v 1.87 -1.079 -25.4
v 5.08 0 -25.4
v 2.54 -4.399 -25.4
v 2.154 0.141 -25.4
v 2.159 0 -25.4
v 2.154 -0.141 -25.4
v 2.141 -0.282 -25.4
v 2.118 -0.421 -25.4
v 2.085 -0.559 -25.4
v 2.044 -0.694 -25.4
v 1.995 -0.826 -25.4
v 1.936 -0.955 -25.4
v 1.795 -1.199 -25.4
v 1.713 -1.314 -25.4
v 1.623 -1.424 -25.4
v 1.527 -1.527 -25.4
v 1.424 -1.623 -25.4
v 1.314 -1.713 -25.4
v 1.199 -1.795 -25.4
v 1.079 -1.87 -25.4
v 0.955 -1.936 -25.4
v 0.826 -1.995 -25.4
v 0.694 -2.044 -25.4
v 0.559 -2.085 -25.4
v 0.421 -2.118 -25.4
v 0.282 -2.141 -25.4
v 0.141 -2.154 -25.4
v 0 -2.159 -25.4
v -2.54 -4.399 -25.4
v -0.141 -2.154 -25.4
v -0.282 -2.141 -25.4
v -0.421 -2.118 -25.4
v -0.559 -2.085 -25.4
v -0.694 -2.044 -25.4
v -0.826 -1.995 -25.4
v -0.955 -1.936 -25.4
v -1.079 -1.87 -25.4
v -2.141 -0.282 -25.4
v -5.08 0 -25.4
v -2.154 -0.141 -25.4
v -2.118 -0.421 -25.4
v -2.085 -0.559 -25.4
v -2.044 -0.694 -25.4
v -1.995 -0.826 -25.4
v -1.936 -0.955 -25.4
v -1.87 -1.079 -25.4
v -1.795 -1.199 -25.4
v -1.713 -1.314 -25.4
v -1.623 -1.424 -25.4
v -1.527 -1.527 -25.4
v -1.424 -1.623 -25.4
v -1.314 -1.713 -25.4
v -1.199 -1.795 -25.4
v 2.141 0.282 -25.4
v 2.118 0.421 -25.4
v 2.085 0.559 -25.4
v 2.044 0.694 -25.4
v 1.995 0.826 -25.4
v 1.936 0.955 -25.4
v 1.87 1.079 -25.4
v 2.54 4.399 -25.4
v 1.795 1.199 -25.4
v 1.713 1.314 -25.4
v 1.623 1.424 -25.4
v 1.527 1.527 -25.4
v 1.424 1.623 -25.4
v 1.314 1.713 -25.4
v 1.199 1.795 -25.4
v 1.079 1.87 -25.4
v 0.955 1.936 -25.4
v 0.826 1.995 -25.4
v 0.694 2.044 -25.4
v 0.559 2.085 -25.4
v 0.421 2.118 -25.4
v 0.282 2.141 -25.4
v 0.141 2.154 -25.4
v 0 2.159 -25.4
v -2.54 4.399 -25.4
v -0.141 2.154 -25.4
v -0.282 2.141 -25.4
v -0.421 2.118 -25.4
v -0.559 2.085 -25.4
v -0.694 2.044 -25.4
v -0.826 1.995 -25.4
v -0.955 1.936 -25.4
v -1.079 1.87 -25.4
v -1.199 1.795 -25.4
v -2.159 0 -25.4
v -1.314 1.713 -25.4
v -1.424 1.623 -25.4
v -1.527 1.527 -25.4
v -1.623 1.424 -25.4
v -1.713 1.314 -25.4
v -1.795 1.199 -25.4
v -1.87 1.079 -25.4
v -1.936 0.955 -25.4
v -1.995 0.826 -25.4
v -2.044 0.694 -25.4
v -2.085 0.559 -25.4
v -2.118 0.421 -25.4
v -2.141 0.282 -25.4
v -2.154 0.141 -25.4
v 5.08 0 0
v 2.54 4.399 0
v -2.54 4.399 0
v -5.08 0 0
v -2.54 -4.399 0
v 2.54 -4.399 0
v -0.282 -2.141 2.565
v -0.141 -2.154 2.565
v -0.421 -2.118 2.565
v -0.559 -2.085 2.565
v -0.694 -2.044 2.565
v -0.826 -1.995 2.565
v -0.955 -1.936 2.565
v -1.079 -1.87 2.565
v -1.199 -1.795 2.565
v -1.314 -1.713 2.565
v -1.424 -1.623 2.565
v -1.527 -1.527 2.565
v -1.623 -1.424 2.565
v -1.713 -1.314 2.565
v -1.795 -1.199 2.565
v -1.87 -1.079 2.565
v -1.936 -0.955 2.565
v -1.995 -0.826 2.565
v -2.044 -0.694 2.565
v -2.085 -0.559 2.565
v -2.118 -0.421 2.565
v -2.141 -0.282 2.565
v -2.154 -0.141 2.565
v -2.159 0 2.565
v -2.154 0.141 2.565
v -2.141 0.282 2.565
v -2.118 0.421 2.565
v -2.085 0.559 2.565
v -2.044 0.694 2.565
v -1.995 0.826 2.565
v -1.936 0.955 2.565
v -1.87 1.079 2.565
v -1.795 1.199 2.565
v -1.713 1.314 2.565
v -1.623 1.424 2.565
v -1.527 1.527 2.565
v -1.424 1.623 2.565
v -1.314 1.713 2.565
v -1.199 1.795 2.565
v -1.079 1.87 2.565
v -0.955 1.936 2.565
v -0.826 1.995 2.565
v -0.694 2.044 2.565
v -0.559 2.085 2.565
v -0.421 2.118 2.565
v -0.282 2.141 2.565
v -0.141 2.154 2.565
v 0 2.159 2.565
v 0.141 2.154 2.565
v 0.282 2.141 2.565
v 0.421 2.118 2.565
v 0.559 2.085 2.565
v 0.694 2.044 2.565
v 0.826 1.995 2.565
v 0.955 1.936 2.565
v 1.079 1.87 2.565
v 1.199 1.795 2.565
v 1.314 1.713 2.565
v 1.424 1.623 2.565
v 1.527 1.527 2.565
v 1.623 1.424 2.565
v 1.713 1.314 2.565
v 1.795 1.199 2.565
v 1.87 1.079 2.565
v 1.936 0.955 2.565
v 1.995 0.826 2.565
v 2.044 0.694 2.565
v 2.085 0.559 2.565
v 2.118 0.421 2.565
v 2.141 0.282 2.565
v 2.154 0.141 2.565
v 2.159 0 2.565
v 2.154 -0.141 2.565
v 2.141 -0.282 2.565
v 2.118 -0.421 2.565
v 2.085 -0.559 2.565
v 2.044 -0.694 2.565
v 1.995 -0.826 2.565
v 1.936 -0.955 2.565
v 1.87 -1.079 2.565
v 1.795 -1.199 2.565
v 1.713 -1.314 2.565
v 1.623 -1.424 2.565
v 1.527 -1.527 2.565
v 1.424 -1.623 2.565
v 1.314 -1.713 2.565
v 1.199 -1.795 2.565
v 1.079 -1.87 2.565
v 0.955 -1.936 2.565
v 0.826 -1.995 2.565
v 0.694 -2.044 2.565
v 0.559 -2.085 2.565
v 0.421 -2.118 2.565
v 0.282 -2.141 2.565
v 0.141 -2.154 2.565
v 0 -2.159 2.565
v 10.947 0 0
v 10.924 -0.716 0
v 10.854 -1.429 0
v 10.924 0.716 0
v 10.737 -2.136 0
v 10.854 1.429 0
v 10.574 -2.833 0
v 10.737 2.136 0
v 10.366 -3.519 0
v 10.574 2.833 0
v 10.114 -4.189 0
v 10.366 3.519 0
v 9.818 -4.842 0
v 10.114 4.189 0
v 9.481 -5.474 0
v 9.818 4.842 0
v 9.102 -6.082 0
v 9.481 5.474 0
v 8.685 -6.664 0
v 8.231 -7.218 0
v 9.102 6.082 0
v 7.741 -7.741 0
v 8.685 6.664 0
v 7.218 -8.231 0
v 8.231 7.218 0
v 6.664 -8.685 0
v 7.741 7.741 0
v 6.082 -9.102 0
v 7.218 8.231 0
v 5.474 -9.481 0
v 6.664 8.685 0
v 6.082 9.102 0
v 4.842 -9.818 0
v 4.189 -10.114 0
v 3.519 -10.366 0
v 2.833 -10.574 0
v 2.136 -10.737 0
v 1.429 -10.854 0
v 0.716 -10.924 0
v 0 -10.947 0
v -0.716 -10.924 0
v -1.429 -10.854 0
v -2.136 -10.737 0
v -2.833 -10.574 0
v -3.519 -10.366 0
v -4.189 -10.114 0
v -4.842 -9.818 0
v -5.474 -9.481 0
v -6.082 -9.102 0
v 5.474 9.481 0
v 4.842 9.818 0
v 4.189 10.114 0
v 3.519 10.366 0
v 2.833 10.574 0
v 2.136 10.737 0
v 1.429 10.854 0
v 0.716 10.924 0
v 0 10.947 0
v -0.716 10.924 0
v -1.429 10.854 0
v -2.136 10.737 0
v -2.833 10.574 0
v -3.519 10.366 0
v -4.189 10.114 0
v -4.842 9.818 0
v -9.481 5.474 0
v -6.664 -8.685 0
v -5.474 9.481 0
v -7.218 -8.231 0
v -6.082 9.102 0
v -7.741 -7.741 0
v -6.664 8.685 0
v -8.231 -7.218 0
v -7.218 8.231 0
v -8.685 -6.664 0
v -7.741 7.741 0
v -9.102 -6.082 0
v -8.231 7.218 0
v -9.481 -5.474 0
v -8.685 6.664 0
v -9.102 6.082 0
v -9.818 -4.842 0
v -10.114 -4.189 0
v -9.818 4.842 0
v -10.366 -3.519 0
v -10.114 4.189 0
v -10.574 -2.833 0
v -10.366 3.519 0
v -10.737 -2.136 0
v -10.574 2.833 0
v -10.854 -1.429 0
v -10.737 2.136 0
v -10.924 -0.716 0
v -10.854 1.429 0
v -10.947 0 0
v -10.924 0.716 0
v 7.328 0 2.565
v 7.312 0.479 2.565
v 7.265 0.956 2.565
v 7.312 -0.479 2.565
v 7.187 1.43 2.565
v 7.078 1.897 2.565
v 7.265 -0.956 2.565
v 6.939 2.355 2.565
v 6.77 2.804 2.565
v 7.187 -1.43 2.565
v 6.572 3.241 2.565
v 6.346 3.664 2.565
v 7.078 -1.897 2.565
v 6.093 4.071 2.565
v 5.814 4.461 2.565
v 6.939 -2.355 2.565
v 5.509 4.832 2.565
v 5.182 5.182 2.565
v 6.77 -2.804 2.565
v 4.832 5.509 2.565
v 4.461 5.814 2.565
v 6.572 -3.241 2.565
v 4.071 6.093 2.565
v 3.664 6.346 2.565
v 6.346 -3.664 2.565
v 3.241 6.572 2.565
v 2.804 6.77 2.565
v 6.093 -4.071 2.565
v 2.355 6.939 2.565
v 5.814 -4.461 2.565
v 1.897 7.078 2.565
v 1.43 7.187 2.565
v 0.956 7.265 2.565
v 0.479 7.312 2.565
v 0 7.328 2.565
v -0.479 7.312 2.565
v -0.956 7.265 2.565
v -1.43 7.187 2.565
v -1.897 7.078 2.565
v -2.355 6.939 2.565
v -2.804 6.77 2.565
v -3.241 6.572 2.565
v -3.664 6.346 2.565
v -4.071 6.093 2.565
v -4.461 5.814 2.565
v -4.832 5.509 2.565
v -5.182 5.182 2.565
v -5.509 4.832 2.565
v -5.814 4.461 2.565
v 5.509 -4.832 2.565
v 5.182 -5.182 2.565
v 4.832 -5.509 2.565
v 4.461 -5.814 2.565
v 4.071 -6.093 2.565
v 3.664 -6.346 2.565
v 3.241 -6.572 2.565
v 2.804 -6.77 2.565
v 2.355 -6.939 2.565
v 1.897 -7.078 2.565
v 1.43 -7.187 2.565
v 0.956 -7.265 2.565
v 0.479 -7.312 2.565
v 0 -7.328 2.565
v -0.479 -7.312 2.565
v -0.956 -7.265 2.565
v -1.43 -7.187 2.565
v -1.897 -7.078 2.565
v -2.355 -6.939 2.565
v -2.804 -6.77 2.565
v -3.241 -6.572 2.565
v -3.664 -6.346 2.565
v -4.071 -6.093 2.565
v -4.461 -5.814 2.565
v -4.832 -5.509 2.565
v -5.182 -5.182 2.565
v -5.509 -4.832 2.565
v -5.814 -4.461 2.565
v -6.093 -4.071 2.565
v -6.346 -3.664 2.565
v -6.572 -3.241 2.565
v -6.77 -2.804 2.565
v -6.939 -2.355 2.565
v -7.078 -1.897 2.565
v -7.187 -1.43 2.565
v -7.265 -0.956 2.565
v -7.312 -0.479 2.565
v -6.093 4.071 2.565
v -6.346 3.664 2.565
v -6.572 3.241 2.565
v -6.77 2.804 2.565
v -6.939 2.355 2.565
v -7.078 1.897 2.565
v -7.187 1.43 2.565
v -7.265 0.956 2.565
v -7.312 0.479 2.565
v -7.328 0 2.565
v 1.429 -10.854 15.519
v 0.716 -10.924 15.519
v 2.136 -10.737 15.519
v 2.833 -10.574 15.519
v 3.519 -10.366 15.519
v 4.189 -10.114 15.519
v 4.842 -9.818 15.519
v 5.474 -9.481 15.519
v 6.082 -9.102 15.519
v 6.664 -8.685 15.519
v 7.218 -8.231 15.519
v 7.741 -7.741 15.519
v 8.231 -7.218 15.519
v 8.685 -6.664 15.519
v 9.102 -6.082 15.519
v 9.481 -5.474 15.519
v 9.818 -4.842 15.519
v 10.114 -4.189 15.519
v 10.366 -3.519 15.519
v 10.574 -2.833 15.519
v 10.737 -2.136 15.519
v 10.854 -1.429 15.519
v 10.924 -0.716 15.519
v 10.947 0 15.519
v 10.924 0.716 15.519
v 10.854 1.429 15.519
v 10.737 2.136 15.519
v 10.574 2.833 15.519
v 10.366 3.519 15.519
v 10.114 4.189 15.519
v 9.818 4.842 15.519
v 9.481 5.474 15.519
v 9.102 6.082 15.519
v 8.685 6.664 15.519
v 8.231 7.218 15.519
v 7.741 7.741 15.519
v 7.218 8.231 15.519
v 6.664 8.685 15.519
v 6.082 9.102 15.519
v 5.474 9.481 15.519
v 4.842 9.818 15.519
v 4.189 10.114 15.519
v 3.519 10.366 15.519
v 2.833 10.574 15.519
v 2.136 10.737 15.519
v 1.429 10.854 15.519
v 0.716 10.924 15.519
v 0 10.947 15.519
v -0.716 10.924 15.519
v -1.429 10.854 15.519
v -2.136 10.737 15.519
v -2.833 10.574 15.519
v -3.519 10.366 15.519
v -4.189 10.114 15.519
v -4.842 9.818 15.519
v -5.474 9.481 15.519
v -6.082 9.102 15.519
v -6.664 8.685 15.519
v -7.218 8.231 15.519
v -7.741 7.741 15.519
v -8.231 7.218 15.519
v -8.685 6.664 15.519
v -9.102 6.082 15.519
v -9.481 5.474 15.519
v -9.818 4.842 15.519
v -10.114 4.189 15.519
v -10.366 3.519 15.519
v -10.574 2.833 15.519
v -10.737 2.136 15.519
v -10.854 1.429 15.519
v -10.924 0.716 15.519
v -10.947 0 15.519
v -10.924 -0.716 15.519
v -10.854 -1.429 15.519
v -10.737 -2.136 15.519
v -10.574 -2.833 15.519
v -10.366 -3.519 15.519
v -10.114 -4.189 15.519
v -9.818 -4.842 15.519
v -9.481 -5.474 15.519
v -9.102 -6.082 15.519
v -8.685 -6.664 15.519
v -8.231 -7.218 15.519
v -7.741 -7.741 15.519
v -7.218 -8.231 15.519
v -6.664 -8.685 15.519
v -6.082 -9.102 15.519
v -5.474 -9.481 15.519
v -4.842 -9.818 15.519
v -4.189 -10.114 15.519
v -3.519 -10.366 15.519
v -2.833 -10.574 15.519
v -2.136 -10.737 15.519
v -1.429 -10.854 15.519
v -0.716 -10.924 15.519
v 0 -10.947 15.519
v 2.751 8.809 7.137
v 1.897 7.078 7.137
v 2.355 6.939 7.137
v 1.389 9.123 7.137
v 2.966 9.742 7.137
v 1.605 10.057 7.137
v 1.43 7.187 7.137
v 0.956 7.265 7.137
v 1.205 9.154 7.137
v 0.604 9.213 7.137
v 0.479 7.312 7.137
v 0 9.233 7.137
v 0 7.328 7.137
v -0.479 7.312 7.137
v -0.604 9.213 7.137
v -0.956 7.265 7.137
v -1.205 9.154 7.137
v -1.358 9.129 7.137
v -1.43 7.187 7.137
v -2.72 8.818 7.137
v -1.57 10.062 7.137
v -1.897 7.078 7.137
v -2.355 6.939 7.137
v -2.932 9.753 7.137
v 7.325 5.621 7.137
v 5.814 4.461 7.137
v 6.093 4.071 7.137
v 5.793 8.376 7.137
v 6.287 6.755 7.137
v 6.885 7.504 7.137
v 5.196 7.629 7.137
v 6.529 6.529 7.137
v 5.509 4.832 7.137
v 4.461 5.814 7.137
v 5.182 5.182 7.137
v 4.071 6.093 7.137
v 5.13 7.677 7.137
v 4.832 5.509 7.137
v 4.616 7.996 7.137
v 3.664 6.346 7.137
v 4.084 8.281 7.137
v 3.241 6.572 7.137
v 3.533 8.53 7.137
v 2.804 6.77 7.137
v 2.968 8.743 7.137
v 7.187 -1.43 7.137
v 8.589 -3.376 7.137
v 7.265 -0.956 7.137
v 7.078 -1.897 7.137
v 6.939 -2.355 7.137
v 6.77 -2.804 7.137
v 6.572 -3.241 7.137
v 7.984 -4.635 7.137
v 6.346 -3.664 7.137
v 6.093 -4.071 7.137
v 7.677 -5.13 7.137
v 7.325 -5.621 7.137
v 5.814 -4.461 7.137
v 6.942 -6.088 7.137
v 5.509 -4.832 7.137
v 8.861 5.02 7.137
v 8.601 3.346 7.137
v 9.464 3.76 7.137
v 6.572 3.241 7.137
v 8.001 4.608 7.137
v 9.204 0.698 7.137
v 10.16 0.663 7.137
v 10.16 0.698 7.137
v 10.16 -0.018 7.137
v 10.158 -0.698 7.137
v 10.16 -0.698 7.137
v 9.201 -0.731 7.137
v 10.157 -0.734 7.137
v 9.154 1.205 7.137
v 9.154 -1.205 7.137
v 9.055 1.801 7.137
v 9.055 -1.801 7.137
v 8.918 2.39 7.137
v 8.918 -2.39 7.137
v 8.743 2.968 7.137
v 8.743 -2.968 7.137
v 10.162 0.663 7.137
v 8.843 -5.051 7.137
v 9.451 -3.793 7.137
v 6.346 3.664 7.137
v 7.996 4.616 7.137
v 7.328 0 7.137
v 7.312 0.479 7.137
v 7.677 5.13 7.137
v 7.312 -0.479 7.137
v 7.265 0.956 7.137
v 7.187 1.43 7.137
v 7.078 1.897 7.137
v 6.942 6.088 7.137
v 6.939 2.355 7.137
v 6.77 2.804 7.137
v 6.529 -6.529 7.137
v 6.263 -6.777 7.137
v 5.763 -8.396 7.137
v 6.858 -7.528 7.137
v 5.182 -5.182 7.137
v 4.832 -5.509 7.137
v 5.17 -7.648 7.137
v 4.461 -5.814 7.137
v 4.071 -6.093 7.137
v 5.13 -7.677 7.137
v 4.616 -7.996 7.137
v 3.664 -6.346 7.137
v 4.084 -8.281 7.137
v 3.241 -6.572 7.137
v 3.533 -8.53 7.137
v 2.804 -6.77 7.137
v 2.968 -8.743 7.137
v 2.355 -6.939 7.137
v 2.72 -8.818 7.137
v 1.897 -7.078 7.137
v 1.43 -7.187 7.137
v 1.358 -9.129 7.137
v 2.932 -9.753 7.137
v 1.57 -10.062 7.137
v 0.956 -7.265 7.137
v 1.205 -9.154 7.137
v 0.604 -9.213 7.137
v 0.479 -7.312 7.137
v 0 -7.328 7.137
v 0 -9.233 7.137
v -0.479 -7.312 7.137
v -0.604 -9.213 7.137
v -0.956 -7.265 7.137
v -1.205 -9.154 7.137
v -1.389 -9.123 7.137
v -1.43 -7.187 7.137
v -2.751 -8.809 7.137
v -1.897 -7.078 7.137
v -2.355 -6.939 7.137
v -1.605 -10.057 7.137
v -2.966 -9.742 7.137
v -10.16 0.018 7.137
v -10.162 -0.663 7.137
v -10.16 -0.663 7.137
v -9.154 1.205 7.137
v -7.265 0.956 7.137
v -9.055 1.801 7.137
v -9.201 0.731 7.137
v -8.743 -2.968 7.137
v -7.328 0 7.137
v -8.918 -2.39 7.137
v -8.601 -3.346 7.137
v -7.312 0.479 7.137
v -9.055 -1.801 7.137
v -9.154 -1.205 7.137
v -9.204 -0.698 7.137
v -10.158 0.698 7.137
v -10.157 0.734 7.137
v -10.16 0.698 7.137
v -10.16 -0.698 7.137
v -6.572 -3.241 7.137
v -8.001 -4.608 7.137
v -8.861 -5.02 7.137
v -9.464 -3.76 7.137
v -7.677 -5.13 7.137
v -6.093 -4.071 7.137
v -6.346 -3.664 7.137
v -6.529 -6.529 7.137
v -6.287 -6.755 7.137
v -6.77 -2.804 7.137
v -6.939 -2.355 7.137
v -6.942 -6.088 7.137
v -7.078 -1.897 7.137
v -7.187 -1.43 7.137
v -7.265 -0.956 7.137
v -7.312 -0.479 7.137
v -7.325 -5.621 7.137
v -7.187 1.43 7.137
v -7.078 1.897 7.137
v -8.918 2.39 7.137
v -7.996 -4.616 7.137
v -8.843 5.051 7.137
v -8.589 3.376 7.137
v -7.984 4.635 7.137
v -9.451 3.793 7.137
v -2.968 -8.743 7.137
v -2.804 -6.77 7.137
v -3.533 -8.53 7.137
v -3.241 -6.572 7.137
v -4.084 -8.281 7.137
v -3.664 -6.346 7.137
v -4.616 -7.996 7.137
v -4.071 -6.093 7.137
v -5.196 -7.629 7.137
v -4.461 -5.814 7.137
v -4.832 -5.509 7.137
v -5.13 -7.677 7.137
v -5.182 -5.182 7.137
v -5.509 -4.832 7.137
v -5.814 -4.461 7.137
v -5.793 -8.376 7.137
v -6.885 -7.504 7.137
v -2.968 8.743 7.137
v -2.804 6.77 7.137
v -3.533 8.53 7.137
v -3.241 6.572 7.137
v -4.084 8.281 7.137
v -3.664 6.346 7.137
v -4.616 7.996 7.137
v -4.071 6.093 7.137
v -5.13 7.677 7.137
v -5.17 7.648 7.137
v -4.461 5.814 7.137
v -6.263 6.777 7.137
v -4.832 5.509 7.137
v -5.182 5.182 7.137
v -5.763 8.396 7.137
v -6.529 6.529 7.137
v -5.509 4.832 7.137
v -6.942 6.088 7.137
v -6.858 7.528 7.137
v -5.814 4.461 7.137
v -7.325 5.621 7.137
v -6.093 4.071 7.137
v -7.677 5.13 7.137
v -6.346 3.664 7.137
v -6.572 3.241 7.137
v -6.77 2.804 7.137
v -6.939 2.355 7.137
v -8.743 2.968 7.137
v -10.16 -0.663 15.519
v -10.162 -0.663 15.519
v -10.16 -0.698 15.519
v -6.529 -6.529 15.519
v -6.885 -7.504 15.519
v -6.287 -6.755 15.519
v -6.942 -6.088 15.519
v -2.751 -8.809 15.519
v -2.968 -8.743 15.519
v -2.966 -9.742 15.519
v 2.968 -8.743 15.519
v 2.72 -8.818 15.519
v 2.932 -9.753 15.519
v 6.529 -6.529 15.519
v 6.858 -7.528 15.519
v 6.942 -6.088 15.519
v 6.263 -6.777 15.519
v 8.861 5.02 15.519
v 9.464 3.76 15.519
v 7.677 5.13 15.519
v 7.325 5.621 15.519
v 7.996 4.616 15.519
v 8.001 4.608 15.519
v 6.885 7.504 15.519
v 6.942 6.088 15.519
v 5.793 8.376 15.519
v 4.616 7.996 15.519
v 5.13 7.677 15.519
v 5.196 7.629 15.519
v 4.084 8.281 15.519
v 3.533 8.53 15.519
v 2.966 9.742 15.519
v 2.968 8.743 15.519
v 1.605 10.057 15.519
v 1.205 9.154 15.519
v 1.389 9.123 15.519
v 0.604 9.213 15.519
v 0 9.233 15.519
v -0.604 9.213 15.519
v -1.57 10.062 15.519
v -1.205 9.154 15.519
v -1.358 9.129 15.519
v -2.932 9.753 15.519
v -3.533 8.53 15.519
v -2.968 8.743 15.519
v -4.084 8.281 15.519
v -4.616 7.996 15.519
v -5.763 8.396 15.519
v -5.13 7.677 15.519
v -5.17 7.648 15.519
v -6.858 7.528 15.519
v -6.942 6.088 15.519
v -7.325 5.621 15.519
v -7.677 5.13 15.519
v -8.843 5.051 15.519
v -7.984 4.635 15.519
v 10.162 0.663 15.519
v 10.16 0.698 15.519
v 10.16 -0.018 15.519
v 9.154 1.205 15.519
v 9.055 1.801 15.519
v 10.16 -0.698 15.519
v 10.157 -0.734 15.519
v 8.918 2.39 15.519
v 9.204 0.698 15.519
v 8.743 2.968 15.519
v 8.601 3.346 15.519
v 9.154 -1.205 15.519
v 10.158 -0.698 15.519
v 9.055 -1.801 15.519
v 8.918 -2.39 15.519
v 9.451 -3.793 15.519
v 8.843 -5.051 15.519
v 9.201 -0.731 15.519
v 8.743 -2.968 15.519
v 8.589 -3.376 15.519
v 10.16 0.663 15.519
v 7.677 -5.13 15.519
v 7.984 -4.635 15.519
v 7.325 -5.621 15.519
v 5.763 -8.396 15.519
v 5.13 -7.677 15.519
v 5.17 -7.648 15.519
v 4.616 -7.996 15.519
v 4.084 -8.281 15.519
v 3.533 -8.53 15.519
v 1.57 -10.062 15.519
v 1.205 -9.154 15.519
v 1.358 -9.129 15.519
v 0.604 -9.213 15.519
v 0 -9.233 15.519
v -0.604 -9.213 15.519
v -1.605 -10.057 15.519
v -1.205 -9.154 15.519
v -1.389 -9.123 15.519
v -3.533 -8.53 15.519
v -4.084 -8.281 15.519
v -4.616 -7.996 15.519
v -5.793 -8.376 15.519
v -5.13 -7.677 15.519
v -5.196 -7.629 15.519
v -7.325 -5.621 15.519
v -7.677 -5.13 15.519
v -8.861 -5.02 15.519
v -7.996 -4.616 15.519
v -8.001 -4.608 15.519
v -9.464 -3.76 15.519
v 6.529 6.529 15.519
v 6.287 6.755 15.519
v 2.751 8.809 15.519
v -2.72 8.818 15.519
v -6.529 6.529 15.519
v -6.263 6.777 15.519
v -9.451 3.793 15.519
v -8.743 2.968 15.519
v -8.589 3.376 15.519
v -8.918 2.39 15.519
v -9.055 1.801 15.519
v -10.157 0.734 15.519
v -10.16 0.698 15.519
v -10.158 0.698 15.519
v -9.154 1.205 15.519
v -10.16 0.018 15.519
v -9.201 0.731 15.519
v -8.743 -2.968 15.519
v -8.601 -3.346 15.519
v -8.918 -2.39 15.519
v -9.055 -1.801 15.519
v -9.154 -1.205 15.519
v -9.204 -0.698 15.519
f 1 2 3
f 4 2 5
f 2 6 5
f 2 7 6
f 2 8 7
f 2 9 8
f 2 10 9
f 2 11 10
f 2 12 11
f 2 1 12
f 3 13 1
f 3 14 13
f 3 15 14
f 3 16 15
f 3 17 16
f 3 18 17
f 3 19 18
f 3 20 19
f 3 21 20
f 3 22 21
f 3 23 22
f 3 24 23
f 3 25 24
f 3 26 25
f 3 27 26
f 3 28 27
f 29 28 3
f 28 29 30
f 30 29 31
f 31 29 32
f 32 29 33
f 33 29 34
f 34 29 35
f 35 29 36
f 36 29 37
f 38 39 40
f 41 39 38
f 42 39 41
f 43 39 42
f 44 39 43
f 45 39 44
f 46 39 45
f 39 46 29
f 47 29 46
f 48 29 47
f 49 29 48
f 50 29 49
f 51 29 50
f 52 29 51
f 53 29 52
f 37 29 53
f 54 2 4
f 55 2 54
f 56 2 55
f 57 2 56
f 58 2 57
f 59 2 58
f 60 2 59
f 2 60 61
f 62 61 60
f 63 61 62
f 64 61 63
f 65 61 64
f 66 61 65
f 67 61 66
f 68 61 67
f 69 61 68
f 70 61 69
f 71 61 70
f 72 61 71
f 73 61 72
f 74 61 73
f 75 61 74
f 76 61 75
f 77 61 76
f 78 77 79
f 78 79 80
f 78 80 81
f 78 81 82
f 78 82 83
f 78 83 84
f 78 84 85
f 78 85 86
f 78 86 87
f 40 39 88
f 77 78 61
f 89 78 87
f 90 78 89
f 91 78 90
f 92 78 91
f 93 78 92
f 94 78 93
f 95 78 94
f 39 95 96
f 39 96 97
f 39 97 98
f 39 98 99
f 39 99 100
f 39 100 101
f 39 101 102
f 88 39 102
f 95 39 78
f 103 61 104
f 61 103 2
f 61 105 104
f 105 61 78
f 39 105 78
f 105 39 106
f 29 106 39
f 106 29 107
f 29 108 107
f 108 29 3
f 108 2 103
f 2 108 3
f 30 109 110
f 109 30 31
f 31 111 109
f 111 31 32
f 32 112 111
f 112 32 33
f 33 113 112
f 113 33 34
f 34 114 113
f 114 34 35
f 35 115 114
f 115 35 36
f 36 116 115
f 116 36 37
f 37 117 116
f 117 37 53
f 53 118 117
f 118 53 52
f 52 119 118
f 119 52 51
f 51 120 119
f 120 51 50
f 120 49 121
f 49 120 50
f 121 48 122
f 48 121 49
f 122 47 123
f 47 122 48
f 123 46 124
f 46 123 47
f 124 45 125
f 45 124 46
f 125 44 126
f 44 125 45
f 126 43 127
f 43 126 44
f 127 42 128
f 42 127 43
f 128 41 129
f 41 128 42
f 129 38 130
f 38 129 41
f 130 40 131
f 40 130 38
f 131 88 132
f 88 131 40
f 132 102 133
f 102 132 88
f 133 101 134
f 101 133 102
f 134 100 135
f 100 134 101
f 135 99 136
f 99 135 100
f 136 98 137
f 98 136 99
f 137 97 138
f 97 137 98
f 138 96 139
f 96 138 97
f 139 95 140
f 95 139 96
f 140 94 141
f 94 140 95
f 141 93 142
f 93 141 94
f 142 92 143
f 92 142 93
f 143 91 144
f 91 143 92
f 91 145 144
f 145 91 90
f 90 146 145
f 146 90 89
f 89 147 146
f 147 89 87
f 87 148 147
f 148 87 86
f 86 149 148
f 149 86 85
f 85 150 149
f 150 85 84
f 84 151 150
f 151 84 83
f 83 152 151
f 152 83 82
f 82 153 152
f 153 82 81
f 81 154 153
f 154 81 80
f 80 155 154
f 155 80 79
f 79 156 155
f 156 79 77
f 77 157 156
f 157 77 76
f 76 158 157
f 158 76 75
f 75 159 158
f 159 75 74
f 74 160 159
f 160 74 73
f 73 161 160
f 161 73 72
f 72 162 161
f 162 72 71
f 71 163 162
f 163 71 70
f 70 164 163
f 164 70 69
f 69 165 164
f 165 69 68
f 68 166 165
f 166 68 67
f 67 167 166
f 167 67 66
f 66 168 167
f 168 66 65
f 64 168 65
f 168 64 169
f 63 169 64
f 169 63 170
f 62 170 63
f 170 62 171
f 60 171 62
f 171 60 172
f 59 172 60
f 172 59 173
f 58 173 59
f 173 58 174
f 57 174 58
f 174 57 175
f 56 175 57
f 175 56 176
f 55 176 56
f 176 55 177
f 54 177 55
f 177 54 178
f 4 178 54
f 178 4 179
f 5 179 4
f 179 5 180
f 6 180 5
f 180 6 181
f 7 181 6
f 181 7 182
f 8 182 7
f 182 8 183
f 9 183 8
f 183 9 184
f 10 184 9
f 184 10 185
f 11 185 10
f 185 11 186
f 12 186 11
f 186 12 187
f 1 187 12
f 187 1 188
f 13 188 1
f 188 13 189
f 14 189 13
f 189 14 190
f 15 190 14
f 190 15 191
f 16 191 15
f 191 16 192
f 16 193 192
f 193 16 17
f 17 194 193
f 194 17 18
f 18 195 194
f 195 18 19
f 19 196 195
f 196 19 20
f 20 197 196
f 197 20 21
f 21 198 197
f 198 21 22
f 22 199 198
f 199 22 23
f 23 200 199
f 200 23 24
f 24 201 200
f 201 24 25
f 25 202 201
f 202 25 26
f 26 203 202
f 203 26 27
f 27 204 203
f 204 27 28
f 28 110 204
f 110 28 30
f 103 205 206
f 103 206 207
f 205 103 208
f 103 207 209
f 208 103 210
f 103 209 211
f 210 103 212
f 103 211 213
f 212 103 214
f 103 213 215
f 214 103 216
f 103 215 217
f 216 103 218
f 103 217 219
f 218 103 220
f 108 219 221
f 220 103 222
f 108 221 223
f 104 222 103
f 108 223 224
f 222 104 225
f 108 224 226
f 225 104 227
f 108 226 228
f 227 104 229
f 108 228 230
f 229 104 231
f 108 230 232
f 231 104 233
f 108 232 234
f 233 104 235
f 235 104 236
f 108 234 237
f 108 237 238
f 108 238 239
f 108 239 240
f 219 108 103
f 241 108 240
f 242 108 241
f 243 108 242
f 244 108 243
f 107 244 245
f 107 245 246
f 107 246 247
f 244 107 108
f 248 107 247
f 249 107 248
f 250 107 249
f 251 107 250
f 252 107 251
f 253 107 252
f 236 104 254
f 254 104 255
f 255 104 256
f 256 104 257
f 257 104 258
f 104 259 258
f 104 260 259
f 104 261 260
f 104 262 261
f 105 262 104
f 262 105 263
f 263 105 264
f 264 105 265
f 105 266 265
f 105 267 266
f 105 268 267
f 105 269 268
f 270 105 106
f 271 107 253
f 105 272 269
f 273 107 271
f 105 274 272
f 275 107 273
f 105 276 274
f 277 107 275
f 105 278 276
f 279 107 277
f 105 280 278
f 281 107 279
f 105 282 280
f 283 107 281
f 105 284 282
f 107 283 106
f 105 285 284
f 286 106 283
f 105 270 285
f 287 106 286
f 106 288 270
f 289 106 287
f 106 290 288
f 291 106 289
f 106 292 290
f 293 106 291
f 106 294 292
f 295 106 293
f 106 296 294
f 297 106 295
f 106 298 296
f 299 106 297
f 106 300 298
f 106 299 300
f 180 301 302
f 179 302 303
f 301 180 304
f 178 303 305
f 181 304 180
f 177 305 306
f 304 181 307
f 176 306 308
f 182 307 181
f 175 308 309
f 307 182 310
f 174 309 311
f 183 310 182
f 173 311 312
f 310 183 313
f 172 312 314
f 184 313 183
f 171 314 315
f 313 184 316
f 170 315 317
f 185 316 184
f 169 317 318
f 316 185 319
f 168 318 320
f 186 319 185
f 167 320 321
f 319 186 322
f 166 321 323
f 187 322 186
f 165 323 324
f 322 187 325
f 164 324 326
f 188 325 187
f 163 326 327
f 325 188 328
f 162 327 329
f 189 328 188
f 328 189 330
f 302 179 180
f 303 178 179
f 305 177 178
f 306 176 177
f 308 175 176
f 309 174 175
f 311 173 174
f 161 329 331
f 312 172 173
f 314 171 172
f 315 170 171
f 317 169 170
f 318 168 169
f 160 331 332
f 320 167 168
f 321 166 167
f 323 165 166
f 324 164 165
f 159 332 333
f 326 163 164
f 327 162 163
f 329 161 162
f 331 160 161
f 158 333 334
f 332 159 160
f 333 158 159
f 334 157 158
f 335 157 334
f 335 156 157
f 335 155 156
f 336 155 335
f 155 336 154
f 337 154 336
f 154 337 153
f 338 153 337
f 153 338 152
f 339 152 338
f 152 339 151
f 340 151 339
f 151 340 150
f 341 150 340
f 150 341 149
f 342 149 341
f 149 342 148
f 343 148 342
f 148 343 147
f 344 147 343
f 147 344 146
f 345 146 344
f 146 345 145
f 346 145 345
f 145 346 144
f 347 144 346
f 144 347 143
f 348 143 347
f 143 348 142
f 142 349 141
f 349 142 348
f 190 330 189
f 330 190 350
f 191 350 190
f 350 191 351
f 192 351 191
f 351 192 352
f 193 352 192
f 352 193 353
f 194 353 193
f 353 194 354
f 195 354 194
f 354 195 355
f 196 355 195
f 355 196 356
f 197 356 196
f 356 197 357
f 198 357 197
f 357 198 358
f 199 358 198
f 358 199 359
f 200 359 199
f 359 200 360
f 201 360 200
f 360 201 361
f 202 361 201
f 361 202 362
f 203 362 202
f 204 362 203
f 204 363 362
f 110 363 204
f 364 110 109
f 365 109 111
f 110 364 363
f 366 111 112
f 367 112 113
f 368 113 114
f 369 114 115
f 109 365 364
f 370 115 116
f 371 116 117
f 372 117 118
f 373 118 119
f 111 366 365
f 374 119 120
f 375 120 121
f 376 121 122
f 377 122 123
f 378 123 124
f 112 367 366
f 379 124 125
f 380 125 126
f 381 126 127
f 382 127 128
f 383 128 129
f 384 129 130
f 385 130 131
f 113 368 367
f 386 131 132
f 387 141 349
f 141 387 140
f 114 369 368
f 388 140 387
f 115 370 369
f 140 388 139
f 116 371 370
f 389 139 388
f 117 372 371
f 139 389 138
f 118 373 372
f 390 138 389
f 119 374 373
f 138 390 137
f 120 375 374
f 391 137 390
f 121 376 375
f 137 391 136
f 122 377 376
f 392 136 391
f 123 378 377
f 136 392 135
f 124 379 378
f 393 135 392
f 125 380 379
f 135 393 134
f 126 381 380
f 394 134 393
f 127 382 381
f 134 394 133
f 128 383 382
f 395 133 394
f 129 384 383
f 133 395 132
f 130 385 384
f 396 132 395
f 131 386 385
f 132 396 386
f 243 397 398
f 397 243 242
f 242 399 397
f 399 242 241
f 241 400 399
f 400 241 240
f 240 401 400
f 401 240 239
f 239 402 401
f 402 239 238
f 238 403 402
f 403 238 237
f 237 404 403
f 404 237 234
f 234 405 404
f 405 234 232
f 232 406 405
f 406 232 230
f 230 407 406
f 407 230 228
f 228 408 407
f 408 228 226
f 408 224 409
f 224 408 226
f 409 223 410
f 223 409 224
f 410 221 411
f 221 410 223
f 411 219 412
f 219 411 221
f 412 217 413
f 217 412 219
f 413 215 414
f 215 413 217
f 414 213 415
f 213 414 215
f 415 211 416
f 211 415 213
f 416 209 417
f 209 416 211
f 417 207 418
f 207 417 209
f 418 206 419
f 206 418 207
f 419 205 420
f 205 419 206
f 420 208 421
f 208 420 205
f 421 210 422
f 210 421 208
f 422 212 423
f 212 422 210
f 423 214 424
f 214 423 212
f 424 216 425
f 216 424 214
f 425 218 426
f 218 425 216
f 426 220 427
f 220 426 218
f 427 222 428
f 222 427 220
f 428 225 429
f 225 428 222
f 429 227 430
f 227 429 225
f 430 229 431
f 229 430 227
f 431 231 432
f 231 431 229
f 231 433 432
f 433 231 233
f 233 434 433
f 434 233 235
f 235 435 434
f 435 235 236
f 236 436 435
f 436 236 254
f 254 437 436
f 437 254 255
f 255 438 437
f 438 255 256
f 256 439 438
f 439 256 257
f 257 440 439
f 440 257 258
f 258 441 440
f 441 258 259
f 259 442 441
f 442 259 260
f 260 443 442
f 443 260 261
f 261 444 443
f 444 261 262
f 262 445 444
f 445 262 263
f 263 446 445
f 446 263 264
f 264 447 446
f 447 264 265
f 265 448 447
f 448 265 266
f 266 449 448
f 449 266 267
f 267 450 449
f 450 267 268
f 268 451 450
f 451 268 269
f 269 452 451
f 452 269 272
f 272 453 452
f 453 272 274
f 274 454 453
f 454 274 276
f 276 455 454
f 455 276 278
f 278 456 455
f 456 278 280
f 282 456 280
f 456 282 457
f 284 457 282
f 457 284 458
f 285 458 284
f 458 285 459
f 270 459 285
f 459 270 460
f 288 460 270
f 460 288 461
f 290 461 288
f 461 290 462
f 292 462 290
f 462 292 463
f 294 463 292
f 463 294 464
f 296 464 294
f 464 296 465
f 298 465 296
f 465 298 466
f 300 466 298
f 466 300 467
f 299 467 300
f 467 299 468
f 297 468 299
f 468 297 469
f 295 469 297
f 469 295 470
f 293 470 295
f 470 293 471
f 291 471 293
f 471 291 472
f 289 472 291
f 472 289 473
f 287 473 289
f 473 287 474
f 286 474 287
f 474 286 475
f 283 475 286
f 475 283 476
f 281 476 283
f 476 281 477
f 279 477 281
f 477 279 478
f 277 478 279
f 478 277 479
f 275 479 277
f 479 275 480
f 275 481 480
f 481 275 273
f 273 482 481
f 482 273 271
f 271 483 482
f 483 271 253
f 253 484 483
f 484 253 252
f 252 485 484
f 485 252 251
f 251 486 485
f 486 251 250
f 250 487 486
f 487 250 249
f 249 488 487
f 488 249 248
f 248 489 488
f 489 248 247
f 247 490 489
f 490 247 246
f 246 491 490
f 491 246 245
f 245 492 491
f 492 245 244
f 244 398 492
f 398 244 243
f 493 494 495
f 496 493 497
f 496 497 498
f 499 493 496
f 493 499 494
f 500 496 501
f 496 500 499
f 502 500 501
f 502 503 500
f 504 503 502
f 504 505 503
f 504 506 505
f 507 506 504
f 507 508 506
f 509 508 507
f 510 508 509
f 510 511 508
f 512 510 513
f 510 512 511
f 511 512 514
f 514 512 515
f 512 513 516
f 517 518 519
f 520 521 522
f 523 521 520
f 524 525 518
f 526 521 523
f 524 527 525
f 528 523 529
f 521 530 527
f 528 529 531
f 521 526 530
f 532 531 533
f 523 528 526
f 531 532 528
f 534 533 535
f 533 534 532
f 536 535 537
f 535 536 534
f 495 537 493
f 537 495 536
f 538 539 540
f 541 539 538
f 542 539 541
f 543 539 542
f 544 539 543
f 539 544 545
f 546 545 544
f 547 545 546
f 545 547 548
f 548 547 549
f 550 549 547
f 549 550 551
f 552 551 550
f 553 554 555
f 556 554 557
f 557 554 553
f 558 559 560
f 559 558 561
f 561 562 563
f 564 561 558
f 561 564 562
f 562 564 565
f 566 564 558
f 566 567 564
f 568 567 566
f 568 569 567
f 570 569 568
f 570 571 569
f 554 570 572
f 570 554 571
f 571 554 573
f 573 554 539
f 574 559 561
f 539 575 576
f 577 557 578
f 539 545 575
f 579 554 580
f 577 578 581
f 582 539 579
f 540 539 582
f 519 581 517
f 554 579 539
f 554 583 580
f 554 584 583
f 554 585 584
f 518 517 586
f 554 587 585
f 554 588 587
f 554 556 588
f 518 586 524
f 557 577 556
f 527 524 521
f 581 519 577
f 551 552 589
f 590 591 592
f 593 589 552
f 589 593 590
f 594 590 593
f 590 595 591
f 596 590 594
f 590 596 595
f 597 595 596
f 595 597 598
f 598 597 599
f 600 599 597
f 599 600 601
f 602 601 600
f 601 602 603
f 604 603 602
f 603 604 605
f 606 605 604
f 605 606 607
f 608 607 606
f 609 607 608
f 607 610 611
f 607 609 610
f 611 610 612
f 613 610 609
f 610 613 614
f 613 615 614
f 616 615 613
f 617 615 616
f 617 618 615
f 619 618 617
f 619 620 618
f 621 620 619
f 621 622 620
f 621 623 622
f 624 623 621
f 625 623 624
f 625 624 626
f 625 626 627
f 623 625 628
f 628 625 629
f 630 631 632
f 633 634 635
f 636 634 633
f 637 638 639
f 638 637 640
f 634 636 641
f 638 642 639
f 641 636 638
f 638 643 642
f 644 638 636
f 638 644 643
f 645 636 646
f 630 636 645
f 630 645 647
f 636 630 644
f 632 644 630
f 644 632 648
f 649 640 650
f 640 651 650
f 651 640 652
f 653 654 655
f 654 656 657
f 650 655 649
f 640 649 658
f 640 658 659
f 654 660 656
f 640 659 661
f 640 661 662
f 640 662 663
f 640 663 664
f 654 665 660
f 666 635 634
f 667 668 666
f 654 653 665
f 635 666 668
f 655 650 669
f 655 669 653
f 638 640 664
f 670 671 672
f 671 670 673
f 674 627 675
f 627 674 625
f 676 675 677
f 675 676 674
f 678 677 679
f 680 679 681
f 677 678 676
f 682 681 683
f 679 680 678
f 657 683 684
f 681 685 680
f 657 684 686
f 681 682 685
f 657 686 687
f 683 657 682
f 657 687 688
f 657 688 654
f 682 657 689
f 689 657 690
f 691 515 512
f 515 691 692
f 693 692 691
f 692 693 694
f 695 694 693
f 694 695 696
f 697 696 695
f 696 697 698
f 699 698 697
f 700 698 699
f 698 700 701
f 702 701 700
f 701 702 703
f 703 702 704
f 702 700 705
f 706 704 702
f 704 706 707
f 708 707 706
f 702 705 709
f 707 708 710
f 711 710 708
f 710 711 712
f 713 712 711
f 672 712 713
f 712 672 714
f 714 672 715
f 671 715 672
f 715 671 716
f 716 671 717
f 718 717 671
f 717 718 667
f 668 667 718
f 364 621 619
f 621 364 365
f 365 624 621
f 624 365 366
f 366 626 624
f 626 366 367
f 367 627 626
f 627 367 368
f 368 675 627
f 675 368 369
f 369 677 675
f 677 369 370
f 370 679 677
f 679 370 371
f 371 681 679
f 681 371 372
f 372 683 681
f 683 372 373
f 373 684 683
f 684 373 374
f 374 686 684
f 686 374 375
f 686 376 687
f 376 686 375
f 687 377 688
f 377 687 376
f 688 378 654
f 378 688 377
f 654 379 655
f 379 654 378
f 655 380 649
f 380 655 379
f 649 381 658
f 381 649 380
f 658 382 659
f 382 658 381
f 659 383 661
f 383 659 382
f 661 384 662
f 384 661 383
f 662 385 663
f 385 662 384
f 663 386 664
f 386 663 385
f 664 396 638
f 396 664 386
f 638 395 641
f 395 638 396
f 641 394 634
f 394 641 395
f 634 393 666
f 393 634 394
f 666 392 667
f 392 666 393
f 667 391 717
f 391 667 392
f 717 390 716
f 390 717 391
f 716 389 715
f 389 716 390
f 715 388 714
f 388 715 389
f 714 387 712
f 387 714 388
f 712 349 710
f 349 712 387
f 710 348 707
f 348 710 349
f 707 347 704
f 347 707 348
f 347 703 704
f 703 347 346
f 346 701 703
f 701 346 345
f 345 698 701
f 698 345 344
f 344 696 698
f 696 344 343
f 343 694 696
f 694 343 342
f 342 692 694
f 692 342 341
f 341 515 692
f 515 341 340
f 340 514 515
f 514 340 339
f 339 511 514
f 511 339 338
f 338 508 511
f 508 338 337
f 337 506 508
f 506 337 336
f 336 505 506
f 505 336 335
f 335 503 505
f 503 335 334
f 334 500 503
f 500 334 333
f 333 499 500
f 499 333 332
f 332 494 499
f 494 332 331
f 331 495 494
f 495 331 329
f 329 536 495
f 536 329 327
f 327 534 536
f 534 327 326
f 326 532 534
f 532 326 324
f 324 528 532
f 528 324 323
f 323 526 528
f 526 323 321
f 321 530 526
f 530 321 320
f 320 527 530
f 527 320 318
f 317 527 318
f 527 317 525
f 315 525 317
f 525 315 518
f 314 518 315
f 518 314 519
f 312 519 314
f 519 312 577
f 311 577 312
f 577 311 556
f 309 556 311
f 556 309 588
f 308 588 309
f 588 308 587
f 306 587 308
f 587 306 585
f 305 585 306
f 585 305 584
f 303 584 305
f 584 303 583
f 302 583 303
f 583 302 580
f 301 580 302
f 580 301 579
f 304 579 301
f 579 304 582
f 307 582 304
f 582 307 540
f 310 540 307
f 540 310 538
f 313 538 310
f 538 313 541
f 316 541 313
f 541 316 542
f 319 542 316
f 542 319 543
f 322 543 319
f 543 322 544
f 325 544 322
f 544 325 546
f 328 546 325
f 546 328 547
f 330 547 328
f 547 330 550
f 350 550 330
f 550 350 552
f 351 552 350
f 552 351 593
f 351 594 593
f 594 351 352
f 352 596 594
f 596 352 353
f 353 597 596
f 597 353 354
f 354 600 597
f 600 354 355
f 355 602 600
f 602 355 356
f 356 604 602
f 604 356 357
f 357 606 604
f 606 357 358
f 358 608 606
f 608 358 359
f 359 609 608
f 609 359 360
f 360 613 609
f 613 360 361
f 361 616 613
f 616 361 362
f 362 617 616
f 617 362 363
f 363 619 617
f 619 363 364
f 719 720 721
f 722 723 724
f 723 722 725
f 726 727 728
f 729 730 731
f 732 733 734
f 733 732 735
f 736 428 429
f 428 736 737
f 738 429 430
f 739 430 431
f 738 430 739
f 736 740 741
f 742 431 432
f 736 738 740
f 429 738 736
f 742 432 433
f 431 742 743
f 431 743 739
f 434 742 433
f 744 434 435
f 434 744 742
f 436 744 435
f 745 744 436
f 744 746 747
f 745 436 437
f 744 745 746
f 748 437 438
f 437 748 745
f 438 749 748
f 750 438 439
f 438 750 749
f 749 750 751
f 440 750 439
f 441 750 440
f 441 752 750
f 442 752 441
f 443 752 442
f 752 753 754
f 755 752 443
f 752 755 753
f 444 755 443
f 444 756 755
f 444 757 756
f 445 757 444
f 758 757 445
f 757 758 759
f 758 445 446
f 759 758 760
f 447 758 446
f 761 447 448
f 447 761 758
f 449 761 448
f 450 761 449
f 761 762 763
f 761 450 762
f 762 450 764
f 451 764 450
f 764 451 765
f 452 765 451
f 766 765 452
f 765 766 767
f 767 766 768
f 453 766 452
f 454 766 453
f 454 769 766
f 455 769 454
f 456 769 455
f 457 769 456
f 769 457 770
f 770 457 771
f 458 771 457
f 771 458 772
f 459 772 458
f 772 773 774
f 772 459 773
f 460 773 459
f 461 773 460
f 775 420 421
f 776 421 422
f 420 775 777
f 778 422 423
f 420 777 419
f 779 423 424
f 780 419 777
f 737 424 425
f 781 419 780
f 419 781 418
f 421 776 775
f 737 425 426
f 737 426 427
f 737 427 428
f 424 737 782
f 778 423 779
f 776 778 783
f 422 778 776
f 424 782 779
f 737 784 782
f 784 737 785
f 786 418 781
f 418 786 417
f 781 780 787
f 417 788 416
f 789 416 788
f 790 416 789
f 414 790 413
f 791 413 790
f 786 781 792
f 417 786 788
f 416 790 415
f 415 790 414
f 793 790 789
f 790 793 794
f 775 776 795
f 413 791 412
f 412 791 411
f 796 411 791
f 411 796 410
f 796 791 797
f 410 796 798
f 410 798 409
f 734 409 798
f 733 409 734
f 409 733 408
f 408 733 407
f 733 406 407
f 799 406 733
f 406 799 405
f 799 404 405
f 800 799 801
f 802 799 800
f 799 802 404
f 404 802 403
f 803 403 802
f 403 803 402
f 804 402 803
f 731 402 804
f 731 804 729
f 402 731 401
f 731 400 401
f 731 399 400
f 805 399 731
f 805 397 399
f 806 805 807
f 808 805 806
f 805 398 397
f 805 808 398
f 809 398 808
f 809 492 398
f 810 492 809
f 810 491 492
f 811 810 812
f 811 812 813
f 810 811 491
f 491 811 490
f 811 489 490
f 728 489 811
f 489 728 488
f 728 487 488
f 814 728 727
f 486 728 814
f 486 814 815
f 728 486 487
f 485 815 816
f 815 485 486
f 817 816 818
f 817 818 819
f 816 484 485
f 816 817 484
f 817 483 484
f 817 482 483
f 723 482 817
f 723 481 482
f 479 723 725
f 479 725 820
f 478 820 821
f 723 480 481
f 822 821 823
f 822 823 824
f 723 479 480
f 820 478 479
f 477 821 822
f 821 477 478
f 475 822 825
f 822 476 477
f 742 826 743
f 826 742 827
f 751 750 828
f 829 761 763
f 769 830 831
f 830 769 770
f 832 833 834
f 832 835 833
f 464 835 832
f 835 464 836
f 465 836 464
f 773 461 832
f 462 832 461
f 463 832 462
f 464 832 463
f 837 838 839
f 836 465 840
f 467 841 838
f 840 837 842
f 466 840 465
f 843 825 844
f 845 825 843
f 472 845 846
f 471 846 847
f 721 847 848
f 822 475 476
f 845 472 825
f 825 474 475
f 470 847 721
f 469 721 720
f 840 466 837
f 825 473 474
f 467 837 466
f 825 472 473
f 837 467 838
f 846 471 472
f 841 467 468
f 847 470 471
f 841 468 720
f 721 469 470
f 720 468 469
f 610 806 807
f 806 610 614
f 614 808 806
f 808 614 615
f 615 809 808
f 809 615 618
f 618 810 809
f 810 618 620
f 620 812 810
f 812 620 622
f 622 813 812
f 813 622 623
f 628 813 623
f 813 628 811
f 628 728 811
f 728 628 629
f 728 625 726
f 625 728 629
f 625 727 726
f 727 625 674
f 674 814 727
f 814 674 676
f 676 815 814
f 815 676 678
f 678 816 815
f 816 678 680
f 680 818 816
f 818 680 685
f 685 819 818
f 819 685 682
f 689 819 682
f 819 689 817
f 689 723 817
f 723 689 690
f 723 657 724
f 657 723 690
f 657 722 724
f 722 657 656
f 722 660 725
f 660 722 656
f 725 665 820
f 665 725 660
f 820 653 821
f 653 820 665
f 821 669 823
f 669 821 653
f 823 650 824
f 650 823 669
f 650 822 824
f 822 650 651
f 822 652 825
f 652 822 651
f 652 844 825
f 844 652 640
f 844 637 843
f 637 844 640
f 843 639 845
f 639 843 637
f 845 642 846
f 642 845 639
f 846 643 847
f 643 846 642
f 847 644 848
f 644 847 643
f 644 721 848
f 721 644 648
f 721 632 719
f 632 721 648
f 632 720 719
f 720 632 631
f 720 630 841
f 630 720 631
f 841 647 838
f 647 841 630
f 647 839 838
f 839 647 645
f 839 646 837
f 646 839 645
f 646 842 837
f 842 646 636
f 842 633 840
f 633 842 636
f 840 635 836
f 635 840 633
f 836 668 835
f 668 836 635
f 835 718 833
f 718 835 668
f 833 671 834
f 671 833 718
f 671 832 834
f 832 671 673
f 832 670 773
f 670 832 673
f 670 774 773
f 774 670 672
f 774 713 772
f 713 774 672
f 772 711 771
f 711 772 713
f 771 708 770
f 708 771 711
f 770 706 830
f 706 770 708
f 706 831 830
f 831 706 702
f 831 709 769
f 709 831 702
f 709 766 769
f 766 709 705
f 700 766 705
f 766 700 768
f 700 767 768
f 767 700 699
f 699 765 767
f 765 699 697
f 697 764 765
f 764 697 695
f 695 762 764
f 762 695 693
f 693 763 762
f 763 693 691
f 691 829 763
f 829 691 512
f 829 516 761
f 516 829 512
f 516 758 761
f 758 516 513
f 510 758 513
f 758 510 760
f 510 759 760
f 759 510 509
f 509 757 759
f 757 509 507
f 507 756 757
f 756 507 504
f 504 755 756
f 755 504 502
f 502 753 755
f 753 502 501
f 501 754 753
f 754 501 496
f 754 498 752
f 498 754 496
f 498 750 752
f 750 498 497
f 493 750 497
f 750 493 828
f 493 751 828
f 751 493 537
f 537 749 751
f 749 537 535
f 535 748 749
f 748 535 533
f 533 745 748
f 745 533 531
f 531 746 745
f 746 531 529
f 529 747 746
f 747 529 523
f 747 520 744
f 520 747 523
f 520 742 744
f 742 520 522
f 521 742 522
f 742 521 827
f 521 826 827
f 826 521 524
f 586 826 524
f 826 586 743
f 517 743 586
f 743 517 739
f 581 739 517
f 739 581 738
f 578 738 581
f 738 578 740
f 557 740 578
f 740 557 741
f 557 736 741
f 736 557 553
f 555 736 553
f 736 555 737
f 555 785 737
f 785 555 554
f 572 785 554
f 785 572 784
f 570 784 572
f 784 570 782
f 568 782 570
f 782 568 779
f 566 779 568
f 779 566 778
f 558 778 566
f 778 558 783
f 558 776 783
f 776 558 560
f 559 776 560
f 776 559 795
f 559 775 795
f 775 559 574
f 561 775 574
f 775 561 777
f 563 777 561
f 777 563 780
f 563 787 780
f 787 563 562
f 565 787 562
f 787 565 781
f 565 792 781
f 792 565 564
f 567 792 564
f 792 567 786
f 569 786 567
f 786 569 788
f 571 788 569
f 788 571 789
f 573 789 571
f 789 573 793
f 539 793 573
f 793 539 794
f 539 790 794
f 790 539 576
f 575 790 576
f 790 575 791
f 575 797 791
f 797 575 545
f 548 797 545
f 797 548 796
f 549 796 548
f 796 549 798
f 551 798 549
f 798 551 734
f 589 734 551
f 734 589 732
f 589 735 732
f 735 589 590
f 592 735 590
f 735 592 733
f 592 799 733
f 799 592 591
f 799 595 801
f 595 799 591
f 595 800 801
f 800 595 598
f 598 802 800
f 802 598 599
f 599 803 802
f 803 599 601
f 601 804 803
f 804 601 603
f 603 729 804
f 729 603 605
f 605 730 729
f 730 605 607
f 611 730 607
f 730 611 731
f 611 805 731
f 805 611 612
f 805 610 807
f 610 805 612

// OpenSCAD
// file: model_bolt_832_1in.scad
module model_bolt_832_1in()
{
    linear_extrude(161)
    circle(267/2, $fn=96);
    translate([0, 0, 160])
    linear_extrude(1000)
    circle(160/2, $fn=96);
}
// file: model_indexwheels.scad
ViewScale = [0.0254, 0.0254, 0.0254];

module model_indexwheels()
{
    color("silver")
    {
        // super8
        linear_extrude(350)
        circle(717/2, $fn=96);
        translate([0, 0, 70])
        linear_extrude(20)
        for (ii = [0:51.4:360])
        {
            rotate([0, 0, ii])
            square([750, 35], center = true);
        }
        translate([0, 0, 349])
        linear_extrude(21)
        circle(750/2, $fn=96);

        // 8mm
        translate([0, 0, 369])
        linear_extrude(350)
        circle(638/2, $fn=96);
        translate([0, 0, 369+65])
        linear_extrude(20)
        for (ii = [51.4/2:51.4:360])
        {
            rotate([0, 0, ii])
            square([720, 35], center = true);
        }
        // shaft
        linear_extrude(3880-800-300)
        //linear_extrude(2500)
        circle(150/2, $fn=96);
    }

}

//module forViewing()
//{
//    model_indexwheels();
//}
//
//module forPrinting()
//{
//}
//
//scale(ViewScale)
//{
//    forViewing();
//}
// main file
include <model_indexwheels.scad>
include <model_bolt_832_1in.scad>

module iwholder()
{
//    linear_extrude(350)
//    circle(727/2, $fn=96);
    outerd = 862;

    translate([0, 0, -1000])
    linear_extrude(1010)
    difference()
    {
        circle(400/2, $fn=6);
        circle(170/2, $fn=96);
    }

    linear_extrude(101)
    difference()
    {
        circle(outerd/2, $fn=96);
        circle(170/2, $fn=96);
    }

    translate([0, 0, 100])
    linear_extrude(181)
    difference()
    {
        circle(outerd/2, $fn=96);
        circle(577/2, $fn=96);
    }
    

    *translate([0, 0, 280])
    linear_extrude(51)
    difference()
    {
        circle(outerd/2, $fn=96);
        circle(727/2, $fn=96);
    }
    translate([0, 0, 280])
    linear_extrude(280+51)
    difference()
    {
        difference()
        {
            circle(outerd/2, $fn=96);
            circle(727/2, $fn=96);
        }
        for (ii = [0:51.4:360])
        {
            rotate([0, 0, ii])
            square([800, 55], center = true);
        }
    }
// --
//    translate([0, 0, 349])
//    linear_extrude(21)
//    circle(750/2, $fn=96);
}

module forViewing()
{
//    translate([0, 0, 5])
//    model_indexwheels();
//    translate([0, 0, 50])
    color("dimgray")
    translate([0, 0, 261])
    rotate([180, 0, 0])
    model_bolt_832_1in();
    iwholder();

}

module forPrinting()
{
    iwholder();
}

scale(ViewScale)
{
    //forViewing();
    forPrinting();
}
